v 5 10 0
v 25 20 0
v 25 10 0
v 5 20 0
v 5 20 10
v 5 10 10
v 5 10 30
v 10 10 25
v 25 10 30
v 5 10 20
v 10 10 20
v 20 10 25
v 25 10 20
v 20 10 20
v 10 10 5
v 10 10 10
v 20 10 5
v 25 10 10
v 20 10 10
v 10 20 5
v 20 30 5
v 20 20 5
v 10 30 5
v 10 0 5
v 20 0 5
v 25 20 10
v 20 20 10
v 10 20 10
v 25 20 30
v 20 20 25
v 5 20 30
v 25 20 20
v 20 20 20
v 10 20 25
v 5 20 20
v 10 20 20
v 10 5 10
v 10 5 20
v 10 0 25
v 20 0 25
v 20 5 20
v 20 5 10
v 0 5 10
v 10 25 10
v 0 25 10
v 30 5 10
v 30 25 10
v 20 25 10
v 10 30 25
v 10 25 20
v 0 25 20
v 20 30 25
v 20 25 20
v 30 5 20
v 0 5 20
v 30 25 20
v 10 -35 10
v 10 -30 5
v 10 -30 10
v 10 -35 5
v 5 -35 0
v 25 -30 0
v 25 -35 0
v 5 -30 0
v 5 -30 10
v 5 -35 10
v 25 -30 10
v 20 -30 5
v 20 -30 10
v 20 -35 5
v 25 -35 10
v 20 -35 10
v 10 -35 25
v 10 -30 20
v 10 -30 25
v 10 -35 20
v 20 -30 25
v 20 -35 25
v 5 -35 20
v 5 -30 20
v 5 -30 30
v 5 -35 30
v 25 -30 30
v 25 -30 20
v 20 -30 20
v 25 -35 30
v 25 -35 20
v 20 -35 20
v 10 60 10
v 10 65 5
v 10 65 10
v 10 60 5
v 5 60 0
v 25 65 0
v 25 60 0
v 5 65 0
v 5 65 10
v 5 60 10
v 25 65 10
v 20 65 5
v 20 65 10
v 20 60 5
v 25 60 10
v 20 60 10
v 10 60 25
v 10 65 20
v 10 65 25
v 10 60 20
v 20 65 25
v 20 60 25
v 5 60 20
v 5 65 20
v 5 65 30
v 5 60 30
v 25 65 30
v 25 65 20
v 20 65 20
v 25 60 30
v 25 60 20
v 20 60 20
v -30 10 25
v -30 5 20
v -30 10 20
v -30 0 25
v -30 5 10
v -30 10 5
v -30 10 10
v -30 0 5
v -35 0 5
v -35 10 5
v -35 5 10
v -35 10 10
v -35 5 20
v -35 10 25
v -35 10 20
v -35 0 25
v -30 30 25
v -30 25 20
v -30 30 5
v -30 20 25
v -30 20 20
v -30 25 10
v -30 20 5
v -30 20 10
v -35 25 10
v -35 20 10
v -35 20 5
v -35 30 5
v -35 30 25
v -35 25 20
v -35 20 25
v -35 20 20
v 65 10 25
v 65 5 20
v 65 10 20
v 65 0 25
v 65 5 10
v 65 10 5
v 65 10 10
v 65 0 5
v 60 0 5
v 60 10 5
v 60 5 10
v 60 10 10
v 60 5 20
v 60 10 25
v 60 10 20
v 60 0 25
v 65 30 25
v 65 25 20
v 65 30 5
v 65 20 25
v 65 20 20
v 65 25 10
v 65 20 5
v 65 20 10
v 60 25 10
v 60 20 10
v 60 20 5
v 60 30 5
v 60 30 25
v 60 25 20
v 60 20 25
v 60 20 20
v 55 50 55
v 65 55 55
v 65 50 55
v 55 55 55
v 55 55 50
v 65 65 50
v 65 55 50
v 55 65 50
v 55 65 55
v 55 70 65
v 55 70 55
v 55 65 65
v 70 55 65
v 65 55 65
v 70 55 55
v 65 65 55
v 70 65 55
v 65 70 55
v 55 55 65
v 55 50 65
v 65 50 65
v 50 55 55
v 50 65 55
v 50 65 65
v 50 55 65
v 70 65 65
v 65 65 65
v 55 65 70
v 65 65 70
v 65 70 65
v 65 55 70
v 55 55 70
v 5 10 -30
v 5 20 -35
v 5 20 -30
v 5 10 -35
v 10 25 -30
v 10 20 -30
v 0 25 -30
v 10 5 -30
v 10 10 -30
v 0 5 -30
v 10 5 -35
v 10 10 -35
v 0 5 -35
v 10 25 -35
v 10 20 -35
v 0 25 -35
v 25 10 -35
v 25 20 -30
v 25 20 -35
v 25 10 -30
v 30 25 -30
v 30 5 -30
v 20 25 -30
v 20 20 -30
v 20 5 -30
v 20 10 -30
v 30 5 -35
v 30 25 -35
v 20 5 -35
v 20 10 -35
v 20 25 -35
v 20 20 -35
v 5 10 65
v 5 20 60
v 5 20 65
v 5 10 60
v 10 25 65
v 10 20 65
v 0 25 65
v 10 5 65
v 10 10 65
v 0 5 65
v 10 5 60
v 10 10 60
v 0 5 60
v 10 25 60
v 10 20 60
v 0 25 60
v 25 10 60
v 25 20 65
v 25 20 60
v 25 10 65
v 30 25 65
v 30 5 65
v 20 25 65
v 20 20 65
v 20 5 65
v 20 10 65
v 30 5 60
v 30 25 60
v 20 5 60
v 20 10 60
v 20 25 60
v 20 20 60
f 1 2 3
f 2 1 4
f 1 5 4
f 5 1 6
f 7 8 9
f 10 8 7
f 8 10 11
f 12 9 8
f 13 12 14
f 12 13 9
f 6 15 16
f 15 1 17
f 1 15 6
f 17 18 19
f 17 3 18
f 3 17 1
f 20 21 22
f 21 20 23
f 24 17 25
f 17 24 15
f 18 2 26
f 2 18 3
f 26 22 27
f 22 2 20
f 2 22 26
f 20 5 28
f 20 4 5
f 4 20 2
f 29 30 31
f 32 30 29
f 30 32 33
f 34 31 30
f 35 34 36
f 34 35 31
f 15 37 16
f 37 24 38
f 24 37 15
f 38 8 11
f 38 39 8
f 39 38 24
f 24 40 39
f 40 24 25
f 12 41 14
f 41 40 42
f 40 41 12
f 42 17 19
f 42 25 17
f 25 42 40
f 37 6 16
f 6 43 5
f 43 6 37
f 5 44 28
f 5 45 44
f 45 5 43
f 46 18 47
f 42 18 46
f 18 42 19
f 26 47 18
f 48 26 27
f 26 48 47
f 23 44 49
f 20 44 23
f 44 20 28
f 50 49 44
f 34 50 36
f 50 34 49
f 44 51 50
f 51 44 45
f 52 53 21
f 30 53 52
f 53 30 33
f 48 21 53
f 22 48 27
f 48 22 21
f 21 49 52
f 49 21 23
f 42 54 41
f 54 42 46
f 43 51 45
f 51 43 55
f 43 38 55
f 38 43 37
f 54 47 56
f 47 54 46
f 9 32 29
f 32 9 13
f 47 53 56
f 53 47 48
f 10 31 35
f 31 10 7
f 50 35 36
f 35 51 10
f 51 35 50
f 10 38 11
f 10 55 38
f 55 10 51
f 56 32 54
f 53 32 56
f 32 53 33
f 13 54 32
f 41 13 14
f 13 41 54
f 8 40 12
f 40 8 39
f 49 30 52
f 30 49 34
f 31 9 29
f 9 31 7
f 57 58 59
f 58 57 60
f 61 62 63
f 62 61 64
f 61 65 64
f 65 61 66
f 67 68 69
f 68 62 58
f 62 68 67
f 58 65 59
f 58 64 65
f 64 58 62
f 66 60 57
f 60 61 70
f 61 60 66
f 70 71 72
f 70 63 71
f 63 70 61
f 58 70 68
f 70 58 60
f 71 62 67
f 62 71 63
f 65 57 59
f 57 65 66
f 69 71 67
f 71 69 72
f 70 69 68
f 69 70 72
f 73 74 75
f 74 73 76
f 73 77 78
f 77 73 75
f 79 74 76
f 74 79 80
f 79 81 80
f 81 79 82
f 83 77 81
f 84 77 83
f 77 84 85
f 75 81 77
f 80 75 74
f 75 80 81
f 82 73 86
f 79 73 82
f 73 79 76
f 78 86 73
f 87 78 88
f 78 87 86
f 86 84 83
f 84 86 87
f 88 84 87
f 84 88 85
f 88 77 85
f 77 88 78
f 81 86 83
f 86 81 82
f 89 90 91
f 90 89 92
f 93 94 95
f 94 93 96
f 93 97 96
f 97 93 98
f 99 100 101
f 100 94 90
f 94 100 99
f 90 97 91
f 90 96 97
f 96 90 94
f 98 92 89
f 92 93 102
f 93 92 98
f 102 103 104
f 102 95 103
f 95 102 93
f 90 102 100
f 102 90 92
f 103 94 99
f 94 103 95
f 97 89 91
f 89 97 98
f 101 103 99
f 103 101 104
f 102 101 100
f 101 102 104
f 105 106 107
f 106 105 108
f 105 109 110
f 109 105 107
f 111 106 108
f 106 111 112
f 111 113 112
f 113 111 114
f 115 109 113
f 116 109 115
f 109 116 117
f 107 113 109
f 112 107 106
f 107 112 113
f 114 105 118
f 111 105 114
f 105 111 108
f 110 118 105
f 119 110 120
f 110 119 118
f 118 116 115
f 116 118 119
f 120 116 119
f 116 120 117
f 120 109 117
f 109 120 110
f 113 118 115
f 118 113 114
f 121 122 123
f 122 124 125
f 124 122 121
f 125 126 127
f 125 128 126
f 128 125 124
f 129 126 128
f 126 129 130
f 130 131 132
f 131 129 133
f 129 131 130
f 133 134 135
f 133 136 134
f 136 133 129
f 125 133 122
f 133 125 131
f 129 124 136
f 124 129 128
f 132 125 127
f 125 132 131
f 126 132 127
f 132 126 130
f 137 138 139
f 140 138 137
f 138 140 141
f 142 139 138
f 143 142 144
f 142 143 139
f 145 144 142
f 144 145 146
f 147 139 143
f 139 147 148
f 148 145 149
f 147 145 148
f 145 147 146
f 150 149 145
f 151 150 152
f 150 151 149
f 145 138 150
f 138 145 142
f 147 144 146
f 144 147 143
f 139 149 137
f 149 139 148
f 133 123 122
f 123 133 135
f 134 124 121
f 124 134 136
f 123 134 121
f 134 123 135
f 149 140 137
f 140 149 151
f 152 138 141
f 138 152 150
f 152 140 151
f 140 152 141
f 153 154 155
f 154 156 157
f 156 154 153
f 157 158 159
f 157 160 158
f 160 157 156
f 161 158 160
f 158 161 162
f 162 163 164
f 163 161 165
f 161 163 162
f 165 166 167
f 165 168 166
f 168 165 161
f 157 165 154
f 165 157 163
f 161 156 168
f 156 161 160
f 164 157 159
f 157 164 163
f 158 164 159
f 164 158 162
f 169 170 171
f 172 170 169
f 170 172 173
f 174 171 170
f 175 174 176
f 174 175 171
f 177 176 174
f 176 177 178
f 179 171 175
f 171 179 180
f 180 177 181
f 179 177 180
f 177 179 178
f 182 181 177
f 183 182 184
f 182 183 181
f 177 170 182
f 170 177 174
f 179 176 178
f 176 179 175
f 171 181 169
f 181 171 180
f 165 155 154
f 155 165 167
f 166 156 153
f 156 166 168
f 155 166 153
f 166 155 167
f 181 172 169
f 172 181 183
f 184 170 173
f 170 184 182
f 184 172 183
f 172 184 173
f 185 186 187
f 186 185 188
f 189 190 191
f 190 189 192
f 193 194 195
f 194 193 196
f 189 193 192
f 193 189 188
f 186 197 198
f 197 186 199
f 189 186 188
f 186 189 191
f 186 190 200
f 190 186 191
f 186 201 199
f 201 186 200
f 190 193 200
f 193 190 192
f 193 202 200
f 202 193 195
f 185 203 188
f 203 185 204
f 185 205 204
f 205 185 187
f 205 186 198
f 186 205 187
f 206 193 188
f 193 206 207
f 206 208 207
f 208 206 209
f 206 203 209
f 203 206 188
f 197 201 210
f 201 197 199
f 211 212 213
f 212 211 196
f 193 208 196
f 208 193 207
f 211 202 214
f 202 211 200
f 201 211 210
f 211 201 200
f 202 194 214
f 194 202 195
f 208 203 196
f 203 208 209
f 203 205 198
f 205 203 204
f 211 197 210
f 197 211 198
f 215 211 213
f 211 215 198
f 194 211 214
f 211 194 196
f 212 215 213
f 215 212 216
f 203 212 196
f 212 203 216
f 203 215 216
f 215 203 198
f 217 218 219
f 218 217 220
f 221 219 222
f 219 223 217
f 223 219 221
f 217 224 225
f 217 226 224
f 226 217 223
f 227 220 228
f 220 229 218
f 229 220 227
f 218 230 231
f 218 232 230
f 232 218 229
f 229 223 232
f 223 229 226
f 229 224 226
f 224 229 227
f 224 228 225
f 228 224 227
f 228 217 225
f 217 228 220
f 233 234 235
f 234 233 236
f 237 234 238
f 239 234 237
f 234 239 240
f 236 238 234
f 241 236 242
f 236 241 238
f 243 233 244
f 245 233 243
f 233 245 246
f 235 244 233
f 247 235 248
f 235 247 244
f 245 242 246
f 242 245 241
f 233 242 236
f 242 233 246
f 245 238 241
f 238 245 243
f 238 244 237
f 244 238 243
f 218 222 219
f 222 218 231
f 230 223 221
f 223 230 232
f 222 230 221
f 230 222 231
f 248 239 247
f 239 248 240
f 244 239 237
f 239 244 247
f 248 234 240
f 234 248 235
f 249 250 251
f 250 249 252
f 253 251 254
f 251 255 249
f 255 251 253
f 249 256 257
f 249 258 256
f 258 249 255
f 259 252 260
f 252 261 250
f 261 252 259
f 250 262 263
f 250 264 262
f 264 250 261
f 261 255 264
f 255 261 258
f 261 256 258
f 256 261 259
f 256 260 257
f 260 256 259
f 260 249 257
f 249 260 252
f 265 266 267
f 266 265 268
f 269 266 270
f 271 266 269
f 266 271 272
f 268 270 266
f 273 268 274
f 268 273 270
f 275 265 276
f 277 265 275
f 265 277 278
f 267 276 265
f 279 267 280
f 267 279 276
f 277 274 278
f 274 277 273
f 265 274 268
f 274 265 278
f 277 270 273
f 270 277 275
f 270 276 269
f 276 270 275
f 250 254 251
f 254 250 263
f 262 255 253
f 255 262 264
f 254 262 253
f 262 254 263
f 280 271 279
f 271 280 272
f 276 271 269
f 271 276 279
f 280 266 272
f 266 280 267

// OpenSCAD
// SCAD file for Six Piece Burr Puzzle
// 整体模型
union() {
  translate([5, 10, 0]) color([0, 0.8, 0, 0.85]) cube([5, 5, 5]);
  translate([10, 10, 0]) color([0, 0.8, 0, 0.85]) cube([5, 5, 5]);
  translate([15, 10, 0]) color([0, 0.8, 0, 0.85]) cube([5, 5, 5]);
  translate([20, 10, 0]) color([0, 0.8, 0, 0.85]) cube([5, 5, 5]);
  translate([5, 15, 0]) color([1, 0, 0, 0.85]) cube([5, 5, 5]);
  translate([10, 15, 0]) color([1, 0, 0, 0.85]) cube([5, 5, 5]);
  translate([15, 15, 0]) color([1, 0, 0, 0.85]) cube([5, 5, 5]);
  translate([20, 15, 0]) color([1, 0, 0, 0.85]) cube([5, 5, 5]);
  translate([10, 0, 5]) color([0.6, 0, 1, 0.85]) cube([5, 5, 5]);
  translate([15, 0, 5]) color([1, 0.4, 0, 0.85]) cube([5, 5, 5]);
  translate([10, 5, 5]) color([0.6, 0, 1, 0.85]) cube([5, 5, 5]);
  translate([15, 5, 5]) color([1, 0.4, 0, 0.85]) cube([5, 5, 5]);
  translate([5, 10, 5]) color([0, 0.8, 0, 0.85]) cube([5, 5, 5]);
  translate([10, 10, 5]) color([0.8, 0.8, 0.8, 0.85]) cube([5, 5, 5]);
  translate([15, 10, 5]) color([0.8, 0.8, 0.8, 0.85]) cube([5, 5, 5]);
  translate([20, 10, 5]) color([0, 0.8, 0, 0.85]) cube([5, 5, 5]);
  translate([5, 15, 5]) color([1, 0, 0, 0.85]) cube([5, 5, 5]);
  translate([10, 15, 5]) color([0.8, 0.8, 0.8, 0.85]) cube([5, 5, 5]);
  translate([15, 15, 5]) color([0.8, 0.8, 0.8, 0.85]) cube([5, 5, 5]);
  translate([20, 15, 5]) color([1, 0, 0, 0.85]) cube([5, 5, 5]);
  translate([10, 20, 5]) color([0.6, 0, 1, 0.85]) cube([5, 5, 5]);
  translate([15, 20, 5]) color([1, 0.4, 0, 0.85]) cube([5, 5, 5]);
  translate([10, 25, 5]) color([0.6, 0, 1, 0.85]) cube([5, 5, 5]);
  translate([15, 25, 5]) color([1, 0.4, 0, 0.85]) cube([5, 5, 5]);
  translate([10, 0, 10]) color([0.6, 0, 1, 0.85]) cube([5, 5, 5]);
  translate([15, 0, 10]) color([1, 0.4, 0, 0.85]) cube([5, 5, 5]);
  translate([0, 5, 10]) color([1, 0.8, 0, 0.85]) cube([5, 5, 5]);
  translate([5, 5, 10]) color([1, 0.8, 0, 0.85]) cube([5, 5, 5]);
  translate([10, 5, 10]) color([0.8, 0.8, 0.8, 0.85]) cube([5, 5, 5]);
  translate([15, 5, 10]) color([0.8, 0.8, 0.8, 0.85]) cube([5, 5, 5]);
  translate([20, 5, 10]) color([1, 0.8, 0, 0.85]) cube([5, 5, 5]);
  translate([25, 5, 10]) color([1, 0.8, 0, 0.85]) cube([5, 5, 5]);
  translate([0, 10, 10]) color([1, 0.8, 0, 0.85]) cube([5, 5, 5]);
  translate([5, 10, 10]) color([0.8, 0.8, 0.8, 0.85]) cube([5, 5, 5]);
  translate([10, 10, 10]) color([0.8, 0.8, 0.8, 0.85]) cube([5, 5, 5]);
  translate([15, 10, 10]) color([0.8, 0.8, 0.8, 0.85]) cube([5, 5, 5]);
  translate([20, 10, 10]) color([0.8, 0.8, 0.8, 0.85]) cube([5, 5, 5]);
  translate([25, 10, 10]) color([1, 0.8, 0, 0.85]) cube([5, 5, 5]);
  translate([0, 15, 10]) color([1, 0.8, 0, 0.85]) cube([5, 5, 5]);
  translate([5, 15, 10]) color([0.8, 0.8, 0.8, 0.85]) cube([5, 5, 5]);
  translate([10, 15, 10]) color([0.8, 0.8, 0.8, 0.85]) cube([5, 5, 5]);
  translate([15, 15, 10]) color([0.8, 0.8, 0.8, 0.85]) cube([5, 5, 5]);
  translate([20, 15, 10]) color([0.8, 0.8, 0.8, 0.85]) cube([5, 5, 5]);
  translate([25, 15, 10]) color([1, 0.8, 0, 0.85]) cube([5, 5, 5]);
  translate([0, 20, 10]) color([1, 0.8, 0, 0.85]) cube([5, 5, 5]);
  translate([5, 20, 10]) color([1, 0.8, 0, 0.85]) cube([5, 5, 5]);
  translate([10, 20, 10]) color([0.8, 0.8, 0.8, 0.85]) cube([5, 5, 5]);
  translate([15, 20, 10]) color([0.8, 0.8, 0.8, 0.85]) cube([5, 5, 5]);
  translate([20, 20, 10]) color([1, 0.8, 0, 0.85]) cube([5, 5, 5]);
  translate([25, 20, 10]) color([1, 0.8, 0, 0.85]) cube([5, 5, 5]);
  translate([10, 25, 10]) color([0.6, 0, 1, 0.85]) cube([5, 5, 5]);
  translate([15, 25, 10]) color([1, 0.4, 0, 0.85]) cube([5, 5, 5]);
  translate([10, 0, 15]) color([0.6, 0, 1, 0.85]) cube([5, 5, 5]);
  translate([15, 0, 15]) color([1, 0.4, 0, 0.85]) cube([5, 5, 5]);
  translate([0, 5, 15]) color([0, 0.4, 1, 0.85]) cube([5, 5, 5]);
  translate([5, 5, 15]) color([0, 0.4, 1, 0.85]) cube([5, 5, 5]);
  translate([10, 5, 15]) color([0.8, 0.8, 0.8, 0.85]) cube([5, 5, 5]);
  translate([15, 5, 15]) color([0.8, 0.8, 0.8, 0.85]) cube([5, 5, 5]);
  translate([20, 5, 15]) color([0, 0.4, 1, 0.85]) cube([5, 5, 5]);
  translate([25, 5, 15]) color([0, 0.4, 1, 0.85]) cube([5, 5, 5]);
  translate([0, 10, 15]) color([0, 0.4, 1, 0.85]) cube([5, 5, 5]);
  translate([5, 10, 15]) color([0.8, 0.8, 0.8, 0.85]) cube([5, 5, 5]);
  translate([10, 10, 15]) color([0.8, 0.8, 0.8, 0.85]) cube([5, 5, 5]);
  translate([15, 10, 15]) color([0.8, 0.8, 0.8, 0.85]) cube([5, 5, 5]);
  translate([20, 10, 15]) color([0.8, 0.8, 0.8, 0.85]) cube([5, 5, 5]);
  translate([25, 10, 15]) color([0, 0.4, 1, 0.85]) cube([5, 5, 5]);
  translate([0, 15, 15]) color([0, 0.4, 1, 0.85]) cube([5, 5, 5]);
  translate([5, 15, 15]) color([0.8, 0.8, 0.8, 0.85]) cube([5, 5, 5]);
  translate([10, 15, 15]) color([0.8, 0.8, 0.8, 0.85]) cube([5, 5, 5]);
  translate([15, 15, 15]) color([0.8, 0.8, 0.8, 0.85]) cube([5, 5, 5]);
  translate([20, 15, 15]) color([0.8, 0.8, 0.8, 0.85]) cube([5, 5, 5]);
  translate([25, 15, 15]) color([0, 0.4, 1, 0.85]) cube([5, 5, 5]);
  translate([0, 20, 15]) color([0, 0.4, 1, 0.85]) cube([5, 5, 5]);
  translate([5, 20, 15]) color([0, 0.4, 1, 0.85]) cube([5, 5, 5]);
  translate([10, 20, 15]) color([0.8, 0.8, 0.8, 0.85]) cube([5, 5, 5]);
  translate([15, 20, 15]) color([0.8, 0.8, 0.8, 0.85]) cube([5, 5, 5]);
  translate([20, 20, 15]) color([0, 0.4, 1, 0.85]) cube([5, 5, 5]);
  translate([25, 20, 15]) color([0, 0.4, 1, 0.85]) cube([5, 5, 5]);
  translate([10, 25, 15]) color([0.6, 0, 1, 0.85]) cube([5, 5, 5]);
  translate([15, 25, 15]) color([1, 0.4, 0, 0.85]) cube([5, 5, 5]);
  translate([10, 0, 20]) color([0.6, 0, 1, 0.85]) cube([5, 5, 5]);
  translate([15, 0, 20]) color([1, 0.4, 0, 0.85]) cube([5, 5, 5]);
  translate([10, 5, 20]) color([0.6, 0, 1, 0.85]) cube([5, 5, 5]);
  translate([15, 5, 20]) color([1, 0.4, 0, 0.85]) cube([5, 5, 5]);
  translate([5, 10, 20]) color([0, 0.8, 0, 0.85]) cube([5, 5, 5]);
  translate([10, 10, 20]) color([0.8, 0.8, 0.8, 0.85]) cube([5, 5, 5]);
  translate([15, 10, 20]) color([0.8, 0.8, 0.8, 0.85]) cube([5, 5, 5]);
  translate([20, 10, 20]) color([0, 0.8, 0, 0.85]) cube([5, 5, 5]);
  translate([5, 15, 20]) color([1, 0, 0, 0.85]) cube([5, 5, 5]);
  translate([10, 15, 20]) color([0.8, 0.8, 0.8, 0.85]) cube([5, 5, 5]);
  translate([15, 15, 20]) color([0.8, 0.8, 0.8, 0.85]) cube([5, 5, 5]);
  translate([20, 15, 20]) color([1, 0, 0, 0.85]) cube([5, 5, 5]);
  translate([10, 20, 20]) color([0.6, 0, 1, 0.85]) cube([5, 5, 5]);
  translate([15, 20, 20]) color([1, 0.4, 0, 0.85]) cube([5, 5, 5]);
  translate([10, 25, 20]) color([0.6, 0, 1, 0.85]) cube([5, 5, 5]);
  translate([15, 25, 20]) color([1, 0.4, 0, 0.85]) cube([5, 5, 5]);
  translate([5, 10, 25]) color([0, 0.8, 0, 0.85]) cube([5, 5, 5]);
  translate([10, 10, 25]) color([0, 0.8, 0, 0.85]) cube([5, 5, 5]);
  translate([15, 10, 25]) color([0, 0.8, 0, 0.85]) cube([5, 5, 5]);
  translate([20, 10, 25]) color([0, 0.8, 0, 0.85]) cube([5, 5, 5]);
  translate([5, 15, 25]) color([1, 0, 0, 0.85]) cube([5, 5, 5]);
  translate([10, 15, 25]) color([1, 0, 0, 0.85]) cube([5, 5, 5]);
  translate([15, 15, 25]) color([1, 0, 0, 0.85]) cube([5, 5, 5]);
  translate([20, 15, 25]) color([1, 0, 0, 0.85]) cube([5, 5, 5]);
}

// 零件 B
union() {
  translate([5.0, -35.0, 0.0]) color([0, 0.8, 0, 0.85]) cube([5, 5, 5]);
  translate([10.0, -35.0, 0.0]) color([0, 0.8, 0, 0.85]) cube([5, 5, 5]);
  translate([15.0, -35.0, 0.0]) color([0, 0.8, 0, 0.85]) cube([5, 5, 5]);
  translate([20.0, -35.0, 0.0]) color([0, 0.8, 0, 0.85]) cube([5, 5, 5]);
  translate([5.0, -35.0, 5.0]) color([0, 0.8, 0, 0.85]) cube([5, 5, 5]);
  translate([20.0, -35.0, 5.0]) color([0, 0.8, 0, 0.85]) cube([5, 5, 5]);
  translate([5.0, -35.0, 20.0]) color([0, 0.8, 0, 0.85]) cube([5, 5, 5]);
  translate([20.0, -35.0, 20.0]) color([0, 0.8, 0, 0.85]) cube([5, 5, 5]);
  translate([5.0, -35.0, 25.0]) color([0, 0.8, 0, 0.85]) cube([5, 5, 5]);
  translate([10.0, -35.0, 25.0]) color([0, 0.8, 0, 0.85]) cube([5, 5, 5]);
  translate([15.0, -35.0, 25.0]) color([0, 0.8, 0, 0.85]) cube([5, 5, 5]);
  translate([20.0, -35.0, 25.0]) color([0, 0.8, 0, 0.85]) cube([5, 5, 5]);
}

// 零件 A
union() {
  translate([5.0, 60.0, 0.0]) color([1, 0, 0, 0.85]) cube([5, 5, 5]);
  translate([10.0, 60.0, 0.0]) color([1, 0, 0, 0.85]) cube([5, 5, 5]);
  translate([15.0, 60.0, 0.0]) color([1, 0, 0, 0.85]) cube([5, 5, 5]);
  translate([20.0, 60.0, 0.0]) color([1, 0, 0, 0.85]) cube([5, 5, 5]);
  translate([5.0, 60.0, 5.0]) color([1, 0, 0, 0.85]) cube([5, 5, 5]);
  translate([20.0, 60.0, 5.0]) color([1, 0, 0, 0.85]) cube([5, 5, 5]);
  translate([5.0, 60.0, 20.0]) color([1, 0, 0, 0.85]) cube([5, 5, 5]);
  translate([20.0, 60.0, 20.0]) color([1, 0, 0, 0.85]) cube([5, 5, 5]);
  translate([5.0, 60.0, 25.0]) color([1, 0, 0, 0.85]) cube([5, 5, 5]);
  translate([10.0, 60.0, 25.0]) color([1, 0, 0, 0.85]) cube([5, 5, 5]);
  translate([15.0, 60.0, 25.0]) color([1, 0, 0, 0.85]) cube([5, 5, 5]);
  translate([20.0, 60.0, 25.0]) color([1, 0, 0, 0.85]) cube([5, 5, 5]);
}

// 零件 F
union() {
  translate([-35.0, 0.0, 5.0]) color([0.6, 0, 1, 0.85]) cube([5, 5, 5]);
  translate([-35.0, 5.0, 5.0]) color([0.6, 0, 1, 0.85]) cube([5, 5, 5]);
  translate([-35.0, 20.0, 5.0]) color([0.6, 0, 1, 0.85]) cube([5, 5, 5]);
  translate([-35.0, 25.0, 5.0]) color([0.6, 0, 1, 0.85]) cube([5, 5, 5]);
  translate([-35.0, 0.0, 10.0]) color([0.6, 0, 1, 0.85]) cube([5, 5, 5]);
  translate([-35.0, 25.0, 10.0]) color([0.6, 0, 1, 0.85]) cube([5, 5, 5]);
  translate([-35.0, 0.0, 15.0]) color([0.6, 0, 1, 0.85]) cube([5, 5, 5]);
  translate([-35.0, 25.0, 15.0]) color([0.6, 0, 1, 0.85]) cube([5, 5, 5]);
  translate([-35.0, 0.0, 20.0]) color([0.6, 0, 1, 0.85]) cube([5, 5, 5]);
  translate([-35.0, 5.0, 20.0]) color([0.6, 0, 1, 0.85]) cube([5, 5, 5]);
  translate([-35.0, 20.0, 20.0]) color([0.6, 0, 1, 0.85]) cube([5, 5, 5]);
  translate([-35.0, 25.0, 20.0]) color([0.6, 0, 1, 0.85]) cube([5, 5, 5]);
}

// 零件 E
union() {
  translate([60.0, 0.0, 5.0]) color([1, 0.4, 0, 0.85]) cube([5, 5, 5]);
  translate([60.0, 5.0, 5.0]) color([1, 0.4, 0, 0.85]) cube([5, 5, 5]);
  translate([60.0, 20.0, 5.0]) color([1, 0.4, 0, 0.85]) cube([5, 5, 5]);
  translate([60.0, 25.0, 5.0]) color([1, 0.4, 0, 0.85]) cube([5, 5, 5]);
  translate([60.0, 0.0, 10.0]) color([1, 0.4, 0, 0.85]) cube([5, 5, 5]);
  translate([60.0, 25.0, 10.0]) color([1, 0.4, 0, 0.85]) cube([5, 5, 5]);
  translate([60.0, 0.0, 15.0]) color([1, 0.4, 0, 0.85]) cube([5, 5, 5]);
  translate([60.0, 25.0, 15.0]) color([1, 0.4, 0, 0.85]) cube([5, 5, 5]);
  translate([60.0, 0.0, 20.0]) color([1, 0.4, 0, 0.85]) cube([5, 5, 5]);
  translate([60.0, 5.0, 20.0]) color([1, 0.4, 0, 0.85]) cube([5, 5, 5]);
  translate([60.0, 20.0, 20.0]) color([1, 0.4, 0, 0.85]) cube([5, 5, 5]);
  translate([60.0, 25.0, 20.0]) color([1, 0.4, 0, 0.85]) cube([5, 5, 5]);
}

// 零件 public
union() {
  translate([55.0, 55.0, 50.0]) color([0.8, 0.8, 0.8, 0.85]) cube([5, 5, 5]);
  translate([60.0, 55.0, 50.0]) color([0.8, 0.8, 0.8, 0.85]) cube([5, 5, 5]);
  translate([55.0, 60.0, 50.0]) color([0.8, 0.8, 0.8, 0.85]) cube([5, 5, 5]);
  translate([60.0, 60.0, 50.0]) color([0.8, 0.8, 0.8, 0.85]) cube([5, 5, 5]);
  translate([55.0, 50.0, 55.0]) color([0.8, 0.8, 0.8, 0.85]) cube([5, 5, 5]);
  translate([60.0, 50.0, 55.0]) color([0.8, 0.8, 0.8, 0.85]) cube([5, 5, 5]);
  translate([50.0, 55.0, 55.0]) color([0.8, 0.8, 0.8, 0.85]) cube([5, 5, 5]);
  translate([55.0, 55.0, 55.0]) color([0.8, 0.8, 0.8, 0.85]) cube([5, 5, 5]);
  translate([60.0, 55.0, 55.0]) color([0.8, 0.8, 0.8, 0.85]) cube([5, 5, 5]);
  translate([65.0, 55.0, 55.0]) color([0.8, 0.8, 0.8, 0.85]) cube([5, 5, 5]);
  translate([50.0, 60.0, 55.0]) color([0.8, 0.8, 0.8, 0.85]) cube([5, 5, 5]);
  translate([55.0, 60.0, 55.0]) color([0.8, 0.8, 0.8, 0.85]) cube([5, 5, 5]);
  translate([60.0, 60.0, 55.0]) color([0.8, 0.8, 0.8, 0.85]) cube([5, 5, 5]);
  translate([65.0, 60.0, 55.0]) color([0.8, 0.8, 0.8, 0.85]) cube([5, 5, 5]);
  translate([55.0, 65.0, 55.0]) color([0.8, 0.8, 0.8, 0.85]) cube([5, 5, 5]);
  translate([60.0, 65.0, 55.0]) color([0.8, 0.8, 0.8, 0.85]) cube([5, 5, 5]);
  translate([55.0, 50.0, 60.0]) color([0.8, 0.8, 0.8, 0.85]) cube([5, 5, 5]);
  translate([60.0, 50.0, 60.0]) color([0.8, 0.8, 0.8, 0.85]) cube([5, 5, 5]);
  translate([50.0, 55.0, 60.0]) color([0.8, 0.8, 0.8, 0.85]) cube([5, 5, 5]);
  translate([55.0, 55.0, 60.0]) color([0.8, 0.8, 0.8, 0.85]) cube([5, 5, 5]);
  translate([60.0, 55.0, 60.0]) color([0.8, 0.8, 0.8, 0.85]) cube([5, 5, 5]);
  translate([65.0, 55.0, 60.0]) color([0.8, 0.8, 0.8, 0.85]) cube([5, 5, 5]);
  translate([50.0, 60.0, 60.0]) color([0.8, 0.8, 0.8, 0.85]) cube([5, 5, 5]);
  translate([55.0, 60.0, 60.0]) color([0.8, 0.8, 0.8, 0.85]) cube([5, 5, 5]);
  translate([60.0, 60.0, 60.0]) color([0.8, 0.8, 0.8, 0.85]) cube([5, 5, 5]);
  translate([65.0, 60.0, 60.0]) color([0.8, 0.8, 0.8, 0.85]) cube([5, 5, 5]);
  translate([55.0, 65.0, 60.0]) color([0.8, 0.8, 0.8, 0.85]) cube([5, 5, 5]);
  translate([60.0, 65.0, 60.0]) color([0.8, 0.8, 0.8, 0.85]) cube([5, 5, 5]);
  translate([55.0, 55.0, 65.0]) color([0.8, 0.8, 0.8, 0.85]) cube([5, 5, 5]);
  translate([60.0, 55.0, 65.0]) color([0.8, 0.8, 0.8, 0.85]) cube([5, 5, 5]);
  translate([55.0, 60.0, 65.0]) color([0.8, 0.8, 0.8, 0.85]) cube([5, 5, 5]);
  translate([60.0, 60.0, 65.0]) color([0.8, 0.8, 0.8, 0.85]) cube([5, 5, 5]);
}

// 零件 D
union() {
  translate([0.0, 5.0, -35.0]) color([1, 0.8, 0, 0.85]) cube([5, 5, 5]);
  translate([5.0, 5.0, -35.0]) color([1, 0.8, 0, 0.85]) cube([5, 5, 5]);
  translate([20.0, 5.0, -35.0]) color([1, 0.8, 0, 0.85]) cube([5, 5, 5]);
  translate([25.0, 5.0, -35.0]) color([1, 0.8, 0, 0.85]) cube([5, 5, 5]);
  translate([0.0, 10.0, -35.0]) color([1, 0.8, 0, 0.85]) cube([5, 5, 5]);
  translate([25.0, 10.0, -35.0]) color([1, 0.8, 0, 0.85]) cube([5, 5, 5]);
  translate([0.0, 15.0, -35.0]) color([1, 0.8, 0, 0.85]) cube([5, 5, 5]);
  translate([25.0, 15.0, -35.0]) color([1, 0.8, 0, 0.85]) cube([5, 5, 5]);
  translate([0.0, 20.0, -35.0]) color([1, 0.8, 0, 0.85]) cube([5, 5, 5]);
  translate([5.0, 20.0, -35.0]) color([1, 0.8, 0, 0.85]) cube([5, 5, 5]);
  translate([20.0, 20.0, -35.0]) color([1, 0.8, 0, 0.85]) cube([5, 5, 5]);
  translate([25.0, 20.0, -35.0]) color([1, 0.8, 0, 0.85]) cube([5, 5, 5]);
}

// 零件 C
union() {
  translate([0.0, 5.0, 60.0]) color([0, 0.4, 1, 0.85]) cube([5, 5, 5]);
  translate([5.0, 5.0, 60.0]) color([0, 0.4, 1, 0.85]) cube([5, 5, 5]);
  translate([20.0, 5.0, 60.0]) color([0, 0.4, 1, 0.85]) cube([5, 5, 5]);
  translate([25.0, 5.0, 60.0]) color([0, 0.4, 1, 0.85]) cube([5, 5, 5]);
  translate([0.0, 10.0, 60.0]) color([0, 0.4, 1, 0.85]) cube([5, 5, 5]);
  translate([25.0, 10.0, 60.0]) color([0, 0.4, 1, 0.85]) cube([5, 5, 5]);
  translate([0.0, 15.0, 60.0]) color([0, 0.4, 1, 0.85]) cube([5, 5, 5]);
  translate([25.0, 15.0, 60.0]) color([0, 0.4, 1, 0.85]) cube([5, 5, 5]);
  translate([0.0, 20.0, 60.0]) color([0, 0.4, 1, 0.85]) cube([5, 5, 5]);
  translate([5.0, 20.0, 60.0]) color([0, 0.4, 1, 0.85]) cube([5, 5, 5]);
  translate([20.0, 20.0, 60.0]) color([0, 0.4, 1, 0.85]) cube([5, 5, 5]);
  translate([25.0, 20.0, 60.0]) color([0, 0.4, 1, 0.85]) cube([5, 5, 5]);
}
